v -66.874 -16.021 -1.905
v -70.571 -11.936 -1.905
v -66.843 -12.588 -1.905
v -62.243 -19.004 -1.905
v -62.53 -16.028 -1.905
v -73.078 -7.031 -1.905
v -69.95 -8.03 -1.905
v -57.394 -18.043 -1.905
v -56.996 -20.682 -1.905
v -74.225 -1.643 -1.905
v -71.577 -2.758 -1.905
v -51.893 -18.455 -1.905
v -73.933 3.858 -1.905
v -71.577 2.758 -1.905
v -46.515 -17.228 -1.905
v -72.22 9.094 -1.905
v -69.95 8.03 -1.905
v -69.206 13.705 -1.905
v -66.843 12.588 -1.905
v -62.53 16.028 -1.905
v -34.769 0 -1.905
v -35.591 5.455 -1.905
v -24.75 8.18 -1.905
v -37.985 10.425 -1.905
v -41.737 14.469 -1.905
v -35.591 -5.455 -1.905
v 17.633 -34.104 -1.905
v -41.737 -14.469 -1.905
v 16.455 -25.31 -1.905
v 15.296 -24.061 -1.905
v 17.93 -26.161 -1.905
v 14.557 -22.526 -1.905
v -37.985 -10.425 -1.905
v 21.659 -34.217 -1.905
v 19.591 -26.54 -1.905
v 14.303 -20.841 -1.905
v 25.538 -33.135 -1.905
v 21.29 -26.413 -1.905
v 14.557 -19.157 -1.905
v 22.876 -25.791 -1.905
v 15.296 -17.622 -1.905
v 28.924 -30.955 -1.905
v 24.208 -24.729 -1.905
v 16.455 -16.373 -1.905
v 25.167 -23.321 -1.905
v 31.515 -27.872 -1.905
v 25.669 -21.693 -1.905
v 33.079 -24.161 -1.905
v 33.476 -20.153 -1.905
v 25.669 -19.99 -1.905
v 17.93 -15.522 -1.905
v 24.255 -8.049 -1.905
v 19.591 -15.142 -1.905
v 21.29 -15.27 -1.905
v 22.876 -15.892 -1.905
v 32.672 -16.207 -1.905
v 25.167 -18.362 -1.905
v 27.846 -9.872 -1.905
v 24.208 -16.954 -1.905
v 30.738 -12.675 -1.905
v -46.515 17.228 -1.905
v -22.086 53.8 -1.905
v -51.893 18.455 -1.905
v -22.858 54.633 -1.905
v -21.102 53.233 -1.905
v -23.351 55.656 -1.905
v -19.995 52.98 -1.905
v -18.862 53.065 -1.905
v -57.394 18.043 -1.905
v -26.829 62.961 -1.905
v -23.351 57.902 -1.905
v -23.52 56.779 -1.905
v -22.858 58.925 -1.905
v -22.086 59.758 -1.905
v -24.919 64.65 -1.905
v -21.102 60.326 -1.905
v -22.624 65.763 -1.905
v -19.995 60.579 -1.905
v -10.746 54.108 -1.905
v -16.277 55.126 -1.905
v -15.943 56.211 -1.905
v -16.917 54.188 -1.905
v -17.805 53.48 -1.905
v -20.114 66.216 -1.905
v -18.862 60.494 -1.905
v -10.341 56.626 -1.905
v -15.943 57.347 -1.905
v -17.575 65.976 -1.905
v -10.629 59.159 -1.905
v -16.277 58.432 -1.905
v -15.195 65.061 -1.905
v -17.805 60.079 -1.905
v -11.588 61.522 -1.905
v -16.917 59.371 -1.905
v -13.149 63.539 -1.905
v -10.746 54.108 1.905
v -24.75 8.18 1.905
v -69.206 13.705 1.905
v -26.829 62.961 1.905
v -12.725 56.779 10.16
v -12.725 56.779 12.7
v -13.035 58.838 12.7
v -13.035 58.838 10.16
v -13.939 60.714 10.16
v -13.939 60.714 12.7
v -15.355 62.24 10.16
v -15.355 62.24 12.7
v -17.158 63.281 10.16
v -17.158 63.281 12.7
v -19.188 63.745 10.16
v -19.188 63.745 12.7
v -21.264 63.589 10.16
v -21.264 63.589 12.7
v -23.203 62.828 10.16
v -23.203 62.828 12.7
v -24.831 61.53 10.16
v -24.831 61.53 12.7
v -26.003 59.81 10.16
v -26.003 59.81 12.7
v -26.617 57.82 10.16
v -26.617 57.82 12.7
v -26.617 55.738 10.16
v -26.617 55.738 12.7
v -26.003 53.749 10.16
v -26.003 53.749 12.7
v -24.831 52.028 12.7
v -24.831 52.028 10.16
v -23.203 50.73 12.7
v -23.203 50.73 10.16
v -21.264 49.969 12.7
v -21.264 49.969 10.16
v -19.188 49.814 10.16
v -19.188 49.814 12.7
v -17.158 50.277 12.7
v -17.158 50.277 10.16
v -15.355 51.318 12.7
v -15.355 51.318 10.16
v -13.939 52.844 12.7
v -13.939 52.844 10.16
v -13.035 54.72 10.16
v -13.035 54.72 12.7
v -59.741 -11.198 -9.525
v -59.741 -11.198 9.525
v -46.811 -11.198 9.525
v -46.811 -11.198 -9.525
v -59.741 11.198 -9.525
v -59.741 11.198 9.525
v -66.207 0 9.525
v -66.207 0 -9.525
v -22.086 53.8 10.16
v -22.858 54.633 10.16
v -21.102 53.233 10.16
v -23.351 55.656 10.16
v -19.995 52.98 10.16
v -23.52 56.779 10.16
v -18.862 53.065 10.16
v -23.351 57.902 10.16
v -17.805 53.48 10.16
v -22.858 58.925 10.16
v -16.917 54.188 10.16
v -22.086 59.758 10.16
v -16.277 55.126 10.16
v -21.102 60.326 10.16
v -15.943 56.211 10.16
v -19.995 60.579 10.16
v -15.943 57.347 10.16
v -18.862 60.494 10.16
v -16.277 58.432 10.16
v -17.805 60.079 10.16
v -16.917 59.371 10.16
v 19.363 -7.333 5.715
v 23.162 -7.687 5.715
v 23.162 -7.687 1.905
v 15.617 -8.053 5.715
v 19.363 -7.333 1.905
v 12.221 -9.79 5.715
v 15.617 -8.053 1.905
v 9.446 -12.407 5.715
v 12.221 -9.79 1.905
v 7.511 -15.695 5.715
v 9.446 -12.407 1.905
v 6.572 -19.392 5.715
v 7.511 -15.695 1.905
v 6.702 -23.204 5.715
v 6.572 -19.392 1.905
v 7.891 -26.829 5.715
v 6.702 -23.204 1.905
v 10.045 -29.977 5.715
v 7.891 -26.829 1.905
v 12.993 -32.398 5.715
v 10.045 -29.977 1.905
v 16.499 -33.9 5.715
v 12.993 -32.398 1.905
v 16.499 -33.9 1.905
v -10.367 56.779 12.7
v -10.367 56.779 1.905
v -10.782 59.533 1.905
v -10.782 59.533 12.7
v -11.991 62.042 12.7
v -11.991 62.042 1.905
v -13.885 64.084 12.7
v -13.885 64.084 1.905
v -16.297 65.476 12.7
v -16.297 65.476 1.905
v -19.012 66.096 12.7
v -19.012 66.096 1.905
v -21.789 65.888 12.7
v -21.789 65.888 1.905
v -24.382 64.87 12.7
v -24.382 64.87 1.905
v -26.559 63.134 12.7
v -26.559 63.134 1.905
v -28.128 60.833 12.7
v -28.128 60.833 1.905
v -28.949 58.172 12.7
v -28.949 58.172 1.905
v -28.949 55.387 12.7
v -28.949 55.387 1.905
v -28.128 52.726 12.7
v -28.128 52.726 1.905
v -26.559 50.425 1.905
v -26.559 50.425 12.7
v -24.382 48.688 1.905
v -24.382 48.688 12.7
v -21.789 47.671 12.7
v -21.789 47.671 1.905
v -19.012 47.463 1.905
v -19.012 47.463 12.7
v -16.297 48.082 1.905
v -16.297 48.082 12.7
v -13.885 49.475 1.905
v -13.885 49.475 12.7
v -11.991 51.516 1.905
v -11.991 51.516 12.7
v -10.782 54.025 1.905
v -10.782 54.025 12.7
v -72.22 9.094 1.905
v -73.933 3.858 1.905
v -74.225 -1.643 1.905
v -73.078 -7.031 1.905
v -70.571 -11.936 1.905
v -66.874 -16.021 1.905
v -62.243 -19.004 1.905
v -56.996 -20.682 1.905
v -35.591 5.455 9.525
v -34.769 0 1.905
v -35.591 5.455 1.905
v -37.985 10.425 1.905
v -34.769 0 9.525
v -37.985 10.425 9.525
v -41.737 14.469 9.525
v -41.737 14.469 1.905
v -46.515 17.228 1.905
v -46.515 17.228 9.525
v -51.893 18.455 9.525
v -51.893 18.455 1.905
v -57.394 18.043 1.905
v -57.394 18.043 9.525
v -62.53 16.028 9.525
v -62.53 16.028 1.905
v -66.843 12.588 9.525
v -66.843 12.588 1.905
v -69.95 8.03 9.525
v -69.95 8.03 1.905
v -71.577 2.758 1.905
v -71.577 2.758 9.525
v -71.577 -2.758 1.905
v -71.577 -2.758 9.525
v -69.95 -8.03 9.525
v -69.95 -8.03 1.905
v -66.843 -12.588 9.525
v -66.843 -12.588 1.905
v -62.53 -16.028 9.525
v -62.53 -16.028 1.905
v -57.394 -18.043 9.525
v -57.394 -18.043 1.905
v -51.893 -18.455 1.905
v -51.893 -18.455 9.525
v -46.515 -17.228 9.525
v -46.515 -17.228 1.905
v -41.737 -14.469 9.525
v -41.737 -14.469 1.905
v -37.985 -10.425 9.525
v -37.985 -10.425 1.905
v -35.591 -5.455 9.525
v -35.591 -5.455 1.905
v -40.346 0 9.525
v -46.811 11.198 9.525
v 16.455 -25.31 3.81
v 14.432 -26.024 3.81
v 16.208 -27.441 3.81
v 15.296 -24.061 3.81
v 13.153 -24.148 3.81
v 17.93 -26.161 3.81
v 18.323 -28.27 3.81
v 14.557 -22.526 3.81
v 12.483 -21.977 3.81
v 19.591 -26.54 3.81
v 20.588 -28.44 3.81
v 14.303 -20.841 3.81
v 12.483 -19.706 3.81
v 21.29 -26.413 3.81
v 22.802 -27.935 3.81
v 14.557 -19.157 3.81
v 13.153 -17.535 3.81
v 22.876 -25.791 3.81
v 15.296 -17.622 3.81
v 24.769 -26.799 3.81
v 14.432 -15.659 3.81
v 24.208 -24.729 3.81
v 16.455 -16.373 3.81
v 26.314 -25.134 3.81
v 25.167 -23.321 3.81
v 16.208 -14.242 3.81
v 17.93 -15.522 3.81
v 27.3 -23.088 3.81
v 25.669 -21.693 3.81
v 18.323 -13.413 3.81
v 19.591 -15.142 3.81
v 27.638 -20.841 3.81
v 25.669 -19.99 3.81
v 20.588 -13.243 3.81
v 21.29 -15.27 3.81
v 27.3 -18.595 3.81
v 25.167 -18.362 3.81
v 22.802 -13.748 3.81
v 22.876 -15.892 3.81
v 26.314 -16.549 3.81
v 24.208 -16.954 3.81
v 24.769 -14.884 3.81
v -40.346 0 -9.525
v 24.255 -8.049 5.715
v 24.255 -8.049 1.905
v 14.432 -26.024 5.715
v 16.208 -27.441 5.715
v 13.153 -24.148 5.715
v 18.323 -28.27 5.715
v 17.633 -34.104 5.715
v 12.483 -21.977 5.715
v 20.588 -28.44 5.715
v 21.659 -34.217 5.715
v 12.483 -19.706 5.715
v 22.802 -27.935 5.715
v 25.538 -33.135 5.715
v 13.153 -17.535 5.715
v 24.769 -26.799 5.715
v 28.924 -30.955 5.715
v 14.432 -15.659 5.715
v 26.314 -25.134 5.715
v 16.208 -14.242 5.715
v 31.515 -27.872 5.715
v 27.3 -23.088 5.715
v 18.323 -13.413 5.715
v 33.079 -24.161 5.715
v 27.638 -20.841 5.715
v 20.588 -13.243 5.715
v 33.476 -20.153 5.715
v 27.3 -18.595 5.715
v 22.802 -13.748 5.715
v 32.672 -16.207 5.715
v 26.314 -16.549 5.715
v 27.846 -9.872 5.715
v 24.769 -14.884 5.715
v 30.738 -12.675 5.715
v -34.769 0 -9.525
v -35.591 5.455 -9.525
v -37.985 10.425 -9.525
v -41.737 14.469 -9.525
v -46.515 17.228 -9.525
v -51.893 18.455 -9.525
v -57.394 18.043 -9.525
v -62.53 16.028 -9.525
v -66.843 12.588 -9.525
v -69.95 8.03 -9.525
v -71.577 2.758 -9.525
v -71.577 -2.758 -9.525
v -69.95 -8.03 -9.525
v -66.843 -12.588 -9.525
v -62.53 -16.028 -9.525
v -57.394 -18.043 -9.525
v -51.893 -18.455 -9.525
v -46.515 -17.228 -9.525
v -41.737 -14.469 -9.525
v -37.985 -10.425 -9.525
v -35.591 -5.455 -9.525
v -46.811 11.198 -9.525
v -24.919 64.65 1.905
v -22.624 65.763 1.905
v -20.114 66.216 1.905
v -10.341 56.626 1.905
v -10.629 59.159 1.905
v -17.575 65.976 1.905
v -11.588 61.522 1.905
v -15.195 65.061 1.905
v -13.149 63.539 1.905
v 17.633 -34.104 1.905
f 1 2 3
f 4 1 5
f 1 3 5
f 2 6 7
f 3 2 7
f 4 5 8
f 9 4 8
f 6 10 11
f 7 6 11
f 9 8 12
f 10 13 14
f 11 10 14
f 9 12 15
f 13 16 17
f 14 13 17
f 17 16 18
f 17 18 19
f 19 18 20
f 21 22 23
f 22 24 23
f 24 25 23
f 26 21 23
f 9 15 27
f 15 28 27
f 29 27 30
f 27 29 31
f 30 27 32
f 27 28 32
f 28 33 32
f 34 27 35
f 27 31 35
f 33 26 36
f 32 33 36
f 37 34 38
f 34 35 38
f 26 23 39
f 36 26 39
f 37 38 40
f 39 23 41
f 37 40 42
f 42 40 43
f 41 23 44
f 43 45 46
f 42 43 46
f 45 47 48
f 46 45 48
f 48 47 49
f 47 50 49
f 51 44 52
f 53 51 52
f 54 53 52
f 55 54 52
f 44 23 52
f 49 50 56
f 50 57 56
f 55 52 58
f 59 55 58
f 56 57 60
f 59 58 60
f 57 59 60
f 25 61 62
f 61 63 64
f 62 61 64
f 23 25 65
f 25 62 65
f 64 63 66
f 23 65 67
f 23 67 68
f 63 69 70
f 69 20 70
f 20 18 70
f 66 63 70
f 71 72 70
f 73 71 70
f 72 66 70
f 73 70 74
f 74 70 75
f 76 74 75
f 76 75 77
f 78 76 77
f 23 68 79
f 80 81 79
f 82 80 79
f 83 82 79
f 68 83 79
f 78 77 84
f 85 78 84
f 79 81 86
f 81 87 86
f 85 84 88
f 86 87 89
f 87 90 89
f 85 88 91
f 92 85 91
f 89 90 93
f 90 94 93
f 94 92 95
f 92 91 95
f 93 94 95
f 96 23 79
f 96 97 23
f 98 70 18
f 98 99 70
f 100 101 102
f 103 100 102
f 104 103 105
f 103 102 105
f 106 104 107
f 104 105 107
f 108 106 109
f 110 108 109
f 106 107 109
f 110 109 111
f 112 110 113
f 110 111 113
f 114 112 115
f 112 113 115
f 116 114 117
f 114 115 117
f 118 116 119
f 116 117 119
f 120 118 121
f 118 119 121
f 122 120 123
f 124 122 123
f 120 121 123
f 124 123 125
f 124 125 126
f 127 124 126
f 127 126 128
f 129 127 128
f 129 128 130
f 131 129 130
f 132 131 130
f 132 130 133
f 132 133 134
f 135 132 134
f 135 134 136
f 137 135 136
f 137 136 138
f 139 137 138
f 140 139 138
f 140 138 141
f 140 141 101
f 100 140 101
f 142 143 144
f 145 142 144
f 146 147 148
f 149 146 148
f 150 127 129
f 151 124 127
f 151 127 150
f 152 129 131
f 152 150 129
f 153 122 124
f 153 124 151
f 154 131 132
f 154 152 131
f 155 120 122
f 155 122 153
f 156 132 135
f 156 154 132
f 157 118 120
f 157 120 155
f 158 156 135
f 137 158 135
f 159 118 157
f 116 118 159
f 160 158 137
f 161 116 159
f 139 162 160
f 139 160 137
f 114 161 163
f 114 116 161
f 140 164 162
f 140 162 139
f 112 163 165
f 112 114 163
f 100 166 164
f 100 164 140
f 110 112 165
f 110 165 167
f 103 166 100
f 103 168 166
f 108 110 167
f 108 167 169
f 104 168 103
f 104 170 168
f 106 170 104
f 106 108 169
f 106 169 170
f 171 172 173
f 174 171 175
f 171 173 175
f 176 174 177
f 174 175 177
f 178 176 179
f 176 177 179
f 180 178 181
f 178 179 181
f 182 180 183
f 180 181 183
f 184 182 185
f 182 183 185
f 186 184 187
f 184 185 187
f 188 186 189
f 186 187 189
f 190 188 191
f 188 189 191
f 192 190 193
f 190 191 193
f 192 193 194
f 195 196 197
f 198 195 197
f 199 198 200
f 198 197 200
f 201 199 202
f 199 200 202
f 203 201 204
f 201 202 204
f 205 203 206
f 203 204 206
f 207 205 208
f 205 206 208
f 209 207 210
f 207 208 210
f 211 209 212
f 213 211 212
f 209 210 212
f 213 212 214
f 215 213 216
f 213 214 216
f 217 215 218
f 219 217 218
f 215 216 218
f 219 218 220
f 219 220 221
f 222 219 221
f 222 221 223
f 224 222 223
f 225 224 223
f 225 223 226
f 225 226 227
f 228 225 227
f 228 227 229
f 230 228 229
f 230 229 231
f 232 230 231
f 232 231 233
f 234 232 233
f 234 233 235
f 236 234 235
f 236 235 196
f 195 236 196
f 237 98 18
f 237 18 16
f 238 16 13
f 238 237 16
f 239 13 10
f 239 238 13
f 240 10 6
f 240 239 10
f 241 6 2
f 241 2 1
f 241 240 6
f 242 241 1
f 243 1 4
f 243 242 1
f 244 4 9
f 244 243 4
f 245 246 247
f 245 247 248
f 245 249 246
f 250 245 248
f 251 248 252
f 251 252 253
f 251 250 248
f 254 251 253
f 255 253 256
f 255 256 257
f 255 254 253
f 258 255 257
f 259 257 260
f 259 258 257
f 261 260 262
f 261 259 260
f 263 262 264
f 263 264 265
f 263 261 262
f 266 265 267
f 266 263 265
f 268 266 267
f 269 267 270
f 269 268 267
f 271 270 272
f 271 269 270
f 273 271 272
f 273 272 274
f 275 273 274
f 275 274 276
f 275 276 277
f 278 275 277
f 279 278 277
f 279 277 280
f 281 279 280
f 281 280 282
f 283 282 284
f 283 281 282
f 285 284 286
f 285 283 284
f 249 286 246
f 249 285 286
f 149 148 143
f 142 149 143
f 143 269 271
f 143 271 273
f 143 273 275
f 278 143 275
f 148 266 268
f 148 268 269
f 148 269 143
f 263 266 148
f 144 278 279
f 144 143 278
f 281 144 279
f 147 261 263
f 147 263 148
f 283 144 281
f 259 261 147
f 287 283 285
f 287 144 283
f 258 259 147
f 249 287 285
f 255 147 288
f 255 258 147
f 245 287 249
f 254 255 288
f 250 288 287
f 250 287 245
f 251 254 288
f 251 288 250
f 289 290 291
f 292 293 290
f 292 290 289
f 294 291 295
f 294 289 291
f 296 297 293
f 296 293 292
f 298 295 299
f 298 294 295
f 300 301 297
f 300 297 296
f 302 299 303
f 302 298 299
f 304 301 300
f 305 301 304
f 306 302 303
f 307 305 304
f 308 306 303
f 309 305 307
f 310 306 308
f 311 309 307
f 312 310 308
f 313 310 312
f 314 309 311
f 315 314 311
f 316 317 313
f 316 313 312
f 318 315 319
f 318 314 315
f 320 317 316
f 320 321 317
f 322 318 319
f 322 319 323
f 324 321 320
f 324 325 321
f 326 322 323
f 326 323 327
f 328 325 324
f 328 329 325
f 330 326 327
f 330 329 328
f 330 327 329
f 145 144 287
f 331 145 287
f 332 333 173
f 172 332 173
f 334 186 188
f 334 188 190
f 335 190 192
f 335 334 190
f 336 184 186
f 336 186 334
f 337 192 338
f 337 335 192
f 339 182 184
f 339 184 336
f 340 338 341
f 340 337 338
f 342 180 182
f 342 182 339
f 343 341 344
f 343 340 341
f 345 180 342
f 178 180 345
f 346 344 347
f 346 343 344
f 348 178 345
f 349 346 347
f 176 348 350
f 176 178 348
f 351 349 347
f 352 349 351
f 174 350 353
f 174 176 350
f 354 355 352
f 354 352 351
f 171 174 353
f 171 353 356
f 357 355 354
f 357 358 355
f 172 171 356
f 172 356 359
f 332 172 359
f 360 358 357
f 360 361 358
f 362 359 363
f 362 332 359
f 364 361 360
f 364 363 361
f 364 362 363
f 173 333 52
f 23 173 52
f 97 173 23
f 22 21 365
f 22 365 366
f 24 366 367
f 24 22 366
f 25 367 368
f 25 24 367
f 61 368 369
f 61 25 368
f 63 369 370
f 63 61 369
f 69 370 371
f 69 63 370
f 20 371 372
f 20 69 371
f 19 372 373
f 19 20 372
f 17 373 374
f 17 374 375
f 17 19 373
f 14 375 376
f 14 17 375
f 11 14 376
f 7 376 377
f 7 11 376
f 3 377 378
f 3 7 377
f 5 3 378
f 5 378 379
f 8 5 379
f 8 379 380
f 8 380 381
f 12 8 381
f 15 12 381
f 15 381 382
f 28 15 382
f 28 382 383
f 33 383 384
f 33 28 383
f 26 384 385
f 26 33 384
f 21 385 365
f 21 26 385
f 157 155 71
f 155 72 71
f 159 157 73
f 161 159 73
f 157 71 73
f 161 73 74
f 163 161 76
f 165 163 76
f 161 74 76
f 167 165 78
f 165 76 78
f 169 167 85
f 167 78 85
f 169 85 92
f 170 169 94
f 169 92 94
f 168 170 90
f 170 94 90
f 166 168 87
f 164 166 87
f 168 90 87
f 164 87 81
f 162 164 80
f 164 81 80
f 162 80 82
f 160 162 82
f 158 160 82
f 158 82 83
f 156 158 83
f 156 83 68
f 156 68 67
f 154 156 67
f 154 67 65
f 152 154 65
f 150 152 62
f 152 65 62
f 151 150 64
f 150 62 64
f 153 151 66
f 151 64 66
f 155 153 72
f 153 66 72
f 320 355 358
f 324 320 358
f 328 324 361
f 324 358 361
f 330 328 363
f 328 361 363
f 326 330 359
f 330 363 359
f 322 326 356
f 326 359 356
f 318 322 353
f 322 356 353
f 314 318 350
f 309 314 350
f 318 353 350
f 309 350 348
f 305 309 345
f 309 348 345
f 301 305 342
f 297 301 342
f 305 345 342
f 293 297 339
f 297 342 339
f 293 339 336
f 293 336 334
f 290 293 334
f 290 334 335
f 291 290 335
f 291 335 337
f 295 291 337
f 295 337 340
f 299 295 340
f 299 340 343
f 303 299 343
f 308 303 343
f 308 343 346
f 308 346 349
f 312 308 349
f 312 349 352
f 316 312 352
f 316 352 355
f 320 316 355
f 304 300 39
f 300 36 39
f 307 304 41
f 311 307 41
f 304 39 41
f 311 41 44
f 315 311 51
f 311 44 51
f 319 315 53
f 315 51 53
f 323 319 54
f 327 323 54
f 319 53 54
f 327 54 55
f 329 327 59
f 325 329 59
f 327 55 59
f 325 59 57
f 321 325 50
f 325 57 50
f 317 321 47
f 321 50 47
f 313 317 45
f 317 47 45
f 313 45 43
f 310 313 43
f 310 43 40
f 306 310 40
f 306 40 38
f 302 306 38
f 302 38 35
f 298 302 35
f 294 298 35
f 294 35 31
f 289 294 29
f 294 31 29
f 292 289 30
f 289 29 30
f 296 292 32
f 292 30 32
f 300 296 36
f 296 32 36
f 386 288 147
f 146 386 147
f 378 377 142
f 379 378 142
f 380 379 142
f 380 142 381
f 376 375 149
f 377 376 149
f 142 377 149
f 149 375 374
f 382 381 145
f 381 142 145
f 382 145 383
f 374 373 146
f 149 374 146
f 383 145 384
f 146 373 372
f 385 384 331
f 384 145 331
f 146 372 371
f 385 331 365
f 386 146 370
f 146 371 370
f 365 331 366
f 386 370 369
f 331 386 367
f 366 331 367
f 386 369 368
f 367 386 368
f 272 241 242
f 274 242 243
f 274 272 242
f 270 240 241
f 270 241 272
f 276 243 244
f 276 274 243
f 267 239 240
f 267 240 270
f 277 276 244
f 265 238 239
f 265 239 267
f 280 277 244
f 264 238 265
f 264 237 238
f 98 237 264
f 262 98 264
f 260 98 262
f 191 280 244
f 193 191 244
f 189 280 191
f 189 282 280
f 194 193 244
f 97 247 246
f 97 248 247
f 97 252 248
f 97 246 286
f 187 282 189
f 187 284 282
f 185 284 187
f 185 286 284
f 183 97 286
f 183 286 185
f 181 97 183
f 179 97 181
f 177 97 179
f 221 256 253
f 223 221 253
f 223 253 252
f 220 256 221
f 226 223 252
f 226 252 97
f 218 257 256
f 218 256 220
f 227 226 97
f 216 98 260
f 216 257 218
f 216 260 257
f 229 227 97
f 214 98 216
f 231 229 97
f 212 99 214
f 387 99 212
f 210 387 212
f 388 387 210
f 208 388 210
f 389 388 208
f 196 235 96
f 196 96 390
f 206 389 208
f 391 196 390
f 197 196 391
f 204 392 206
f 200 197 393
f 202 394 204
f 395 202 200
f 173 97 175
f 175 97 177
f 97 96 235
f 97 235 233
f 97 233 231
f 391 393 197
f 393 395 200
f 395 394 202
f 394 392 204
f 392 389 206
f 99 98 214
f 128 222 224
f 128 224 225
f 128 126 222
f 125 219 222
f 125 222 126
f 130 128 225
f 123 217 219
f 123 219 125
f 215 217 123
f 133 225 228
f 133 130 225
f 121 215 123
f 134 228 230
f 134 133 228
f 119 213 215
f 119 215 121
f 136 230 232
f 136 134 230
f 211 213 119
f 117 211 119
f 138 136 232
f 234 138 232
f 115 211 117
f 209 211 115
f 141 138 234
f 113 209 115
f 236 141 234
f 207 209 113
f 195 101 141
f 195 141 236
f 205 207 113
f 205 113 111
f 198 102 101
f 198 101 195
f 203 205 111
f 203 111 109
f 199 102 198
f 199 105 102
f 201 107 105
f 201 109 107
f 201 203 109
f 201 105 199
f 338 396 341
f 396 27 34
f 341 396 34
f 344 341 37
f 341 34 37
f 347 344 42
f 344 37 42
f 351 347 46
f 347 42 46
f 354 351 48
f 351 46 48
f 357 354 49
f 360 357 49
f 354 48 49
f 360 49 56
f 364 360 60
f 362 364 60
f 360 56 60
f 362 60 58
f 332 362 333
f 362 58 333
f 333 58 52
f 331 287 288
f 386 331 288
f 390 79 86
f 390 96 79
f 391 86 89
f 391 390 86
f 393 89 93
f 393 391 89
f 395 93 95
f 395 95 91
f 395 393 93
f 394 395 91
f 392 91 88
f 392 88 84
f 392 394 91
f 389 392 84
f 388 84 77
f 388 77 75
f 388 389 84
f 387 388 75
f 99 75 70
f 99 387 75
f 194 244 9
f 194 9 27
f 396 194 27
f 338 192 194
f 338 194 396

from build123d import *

# Parameters (mm, degrees)
F1_DEPTH        = 1.905
F2_R            = 9.34282
F3_DEPTH        = 12.7
F5_DEPTH        = 3.81
F6_R            = 18.50711
F7_DEPTH        = 9.525
F9_D            = 7.62
F9_DEPTH        = 101.6
F9_CBORE_D      = 13.97
F9_CBORE_DEPTH  = 2.54
F11_D           = 11.43
F11_DEPTH       = 101.6
F11_CBORE_D     = 15.24
F11_CBORE_DEPTH = 1.905
F13_DEPTH       = 19.051


with BuildPart() as f1:
    # F0 (on Top) → F1 (new body, symmetric)
    with BuildSketch(Plane.XY):
        with BuildLine():
            Line((-26.829338, 62.961267), (-69.205798, 13.704629))
            ThreePointArc((-69.205798, 13.704629), (-73.078408, -7.031412), (-56.99586, -20.681764))
            Line((-56.99586, -20.681764), (17.632922, -34.104249))
            ThreePointArc((17.632922, -34.104249), (33.078712, -24.160767), (24.254834, -8.049144))
            Line((24.254834, -8.049144), (-24.750318, 8.18019))
            Line((-24.750318, 8.18019), (-10.746106, 54.107821))
            ThreePointArc((-10.746106, 54.107821), (-15.194985, 65.061135), (-26.829338, 62.961267))
        make_face()
    extrude(amount=F1_DEPTH, both=True)

    # F2 (on Top) → F3 (join)
    with BuildSketch(Plane.XY):
        with Locations((-19.710172, 56.779236)):
            Circle(F2_R)
    extrude(amount=F3_DEPTH)

    # F4 (on face) → F5 (join)
    with BuildSketch(Plane.XY.offset(1.905)):
        with BuildLine():
            Line((24.254834, -8.049144), (23.161608, -7.687093))
            ThreePointArc((23.161608, -7.687093), (6.910327, -17.510066), (16.499491, -33.900394))
            Line((16.499491, -33.900394), (17.632922, -34.104249))
            ThreePointArc((17.632922, -34.104249), (33.078712, -24.160767), (24.254834, -8.049144))
        make_face()
    extrude(amount=F5_DEPTH)

    # F6 (on Top) → F7 (join, symmetric)
    with BuildSketch(Plane.XY):
        with Locations((-53.276106, 0)):
            Circle(F6_R)
    extrude(amount=F7_DEPTH, both=True)

    # F9
    with Locations(Plane.XY.offset(12.7)):
        with Locations((-19.710172, 56.779236)):
            CounterBoreHole(F9_D / 2, F9_CBORE_D / 2, F9_CBORE_DEPTH, depth=F9_DEPTH)

    # F11
    with Locations(Plane.XY.offset(5.715)):
        with Locations((20.018323, -20.841466)):
            CounterBoreHole(F11_D / 2, F11_CBORE_D / 2, F11_CBORE_DEPTH, depth=F11_DEPTH)

    # F12 (on face) → F13 (cut, through all)
    with BuildSketch(Plane.XY.offset(9.525)):
        Polygon((-46.810882, 11.198097), (-59.74133, 11.198097), (-66.206555, 0), (-59.74133, -11.198097), (-46.810882, -11.198097), (-40.345658, 0), align=None)
    extrude(amount=-F13_DEPTH, mode=Mode.SUBTRACT)


solid = f1.part
